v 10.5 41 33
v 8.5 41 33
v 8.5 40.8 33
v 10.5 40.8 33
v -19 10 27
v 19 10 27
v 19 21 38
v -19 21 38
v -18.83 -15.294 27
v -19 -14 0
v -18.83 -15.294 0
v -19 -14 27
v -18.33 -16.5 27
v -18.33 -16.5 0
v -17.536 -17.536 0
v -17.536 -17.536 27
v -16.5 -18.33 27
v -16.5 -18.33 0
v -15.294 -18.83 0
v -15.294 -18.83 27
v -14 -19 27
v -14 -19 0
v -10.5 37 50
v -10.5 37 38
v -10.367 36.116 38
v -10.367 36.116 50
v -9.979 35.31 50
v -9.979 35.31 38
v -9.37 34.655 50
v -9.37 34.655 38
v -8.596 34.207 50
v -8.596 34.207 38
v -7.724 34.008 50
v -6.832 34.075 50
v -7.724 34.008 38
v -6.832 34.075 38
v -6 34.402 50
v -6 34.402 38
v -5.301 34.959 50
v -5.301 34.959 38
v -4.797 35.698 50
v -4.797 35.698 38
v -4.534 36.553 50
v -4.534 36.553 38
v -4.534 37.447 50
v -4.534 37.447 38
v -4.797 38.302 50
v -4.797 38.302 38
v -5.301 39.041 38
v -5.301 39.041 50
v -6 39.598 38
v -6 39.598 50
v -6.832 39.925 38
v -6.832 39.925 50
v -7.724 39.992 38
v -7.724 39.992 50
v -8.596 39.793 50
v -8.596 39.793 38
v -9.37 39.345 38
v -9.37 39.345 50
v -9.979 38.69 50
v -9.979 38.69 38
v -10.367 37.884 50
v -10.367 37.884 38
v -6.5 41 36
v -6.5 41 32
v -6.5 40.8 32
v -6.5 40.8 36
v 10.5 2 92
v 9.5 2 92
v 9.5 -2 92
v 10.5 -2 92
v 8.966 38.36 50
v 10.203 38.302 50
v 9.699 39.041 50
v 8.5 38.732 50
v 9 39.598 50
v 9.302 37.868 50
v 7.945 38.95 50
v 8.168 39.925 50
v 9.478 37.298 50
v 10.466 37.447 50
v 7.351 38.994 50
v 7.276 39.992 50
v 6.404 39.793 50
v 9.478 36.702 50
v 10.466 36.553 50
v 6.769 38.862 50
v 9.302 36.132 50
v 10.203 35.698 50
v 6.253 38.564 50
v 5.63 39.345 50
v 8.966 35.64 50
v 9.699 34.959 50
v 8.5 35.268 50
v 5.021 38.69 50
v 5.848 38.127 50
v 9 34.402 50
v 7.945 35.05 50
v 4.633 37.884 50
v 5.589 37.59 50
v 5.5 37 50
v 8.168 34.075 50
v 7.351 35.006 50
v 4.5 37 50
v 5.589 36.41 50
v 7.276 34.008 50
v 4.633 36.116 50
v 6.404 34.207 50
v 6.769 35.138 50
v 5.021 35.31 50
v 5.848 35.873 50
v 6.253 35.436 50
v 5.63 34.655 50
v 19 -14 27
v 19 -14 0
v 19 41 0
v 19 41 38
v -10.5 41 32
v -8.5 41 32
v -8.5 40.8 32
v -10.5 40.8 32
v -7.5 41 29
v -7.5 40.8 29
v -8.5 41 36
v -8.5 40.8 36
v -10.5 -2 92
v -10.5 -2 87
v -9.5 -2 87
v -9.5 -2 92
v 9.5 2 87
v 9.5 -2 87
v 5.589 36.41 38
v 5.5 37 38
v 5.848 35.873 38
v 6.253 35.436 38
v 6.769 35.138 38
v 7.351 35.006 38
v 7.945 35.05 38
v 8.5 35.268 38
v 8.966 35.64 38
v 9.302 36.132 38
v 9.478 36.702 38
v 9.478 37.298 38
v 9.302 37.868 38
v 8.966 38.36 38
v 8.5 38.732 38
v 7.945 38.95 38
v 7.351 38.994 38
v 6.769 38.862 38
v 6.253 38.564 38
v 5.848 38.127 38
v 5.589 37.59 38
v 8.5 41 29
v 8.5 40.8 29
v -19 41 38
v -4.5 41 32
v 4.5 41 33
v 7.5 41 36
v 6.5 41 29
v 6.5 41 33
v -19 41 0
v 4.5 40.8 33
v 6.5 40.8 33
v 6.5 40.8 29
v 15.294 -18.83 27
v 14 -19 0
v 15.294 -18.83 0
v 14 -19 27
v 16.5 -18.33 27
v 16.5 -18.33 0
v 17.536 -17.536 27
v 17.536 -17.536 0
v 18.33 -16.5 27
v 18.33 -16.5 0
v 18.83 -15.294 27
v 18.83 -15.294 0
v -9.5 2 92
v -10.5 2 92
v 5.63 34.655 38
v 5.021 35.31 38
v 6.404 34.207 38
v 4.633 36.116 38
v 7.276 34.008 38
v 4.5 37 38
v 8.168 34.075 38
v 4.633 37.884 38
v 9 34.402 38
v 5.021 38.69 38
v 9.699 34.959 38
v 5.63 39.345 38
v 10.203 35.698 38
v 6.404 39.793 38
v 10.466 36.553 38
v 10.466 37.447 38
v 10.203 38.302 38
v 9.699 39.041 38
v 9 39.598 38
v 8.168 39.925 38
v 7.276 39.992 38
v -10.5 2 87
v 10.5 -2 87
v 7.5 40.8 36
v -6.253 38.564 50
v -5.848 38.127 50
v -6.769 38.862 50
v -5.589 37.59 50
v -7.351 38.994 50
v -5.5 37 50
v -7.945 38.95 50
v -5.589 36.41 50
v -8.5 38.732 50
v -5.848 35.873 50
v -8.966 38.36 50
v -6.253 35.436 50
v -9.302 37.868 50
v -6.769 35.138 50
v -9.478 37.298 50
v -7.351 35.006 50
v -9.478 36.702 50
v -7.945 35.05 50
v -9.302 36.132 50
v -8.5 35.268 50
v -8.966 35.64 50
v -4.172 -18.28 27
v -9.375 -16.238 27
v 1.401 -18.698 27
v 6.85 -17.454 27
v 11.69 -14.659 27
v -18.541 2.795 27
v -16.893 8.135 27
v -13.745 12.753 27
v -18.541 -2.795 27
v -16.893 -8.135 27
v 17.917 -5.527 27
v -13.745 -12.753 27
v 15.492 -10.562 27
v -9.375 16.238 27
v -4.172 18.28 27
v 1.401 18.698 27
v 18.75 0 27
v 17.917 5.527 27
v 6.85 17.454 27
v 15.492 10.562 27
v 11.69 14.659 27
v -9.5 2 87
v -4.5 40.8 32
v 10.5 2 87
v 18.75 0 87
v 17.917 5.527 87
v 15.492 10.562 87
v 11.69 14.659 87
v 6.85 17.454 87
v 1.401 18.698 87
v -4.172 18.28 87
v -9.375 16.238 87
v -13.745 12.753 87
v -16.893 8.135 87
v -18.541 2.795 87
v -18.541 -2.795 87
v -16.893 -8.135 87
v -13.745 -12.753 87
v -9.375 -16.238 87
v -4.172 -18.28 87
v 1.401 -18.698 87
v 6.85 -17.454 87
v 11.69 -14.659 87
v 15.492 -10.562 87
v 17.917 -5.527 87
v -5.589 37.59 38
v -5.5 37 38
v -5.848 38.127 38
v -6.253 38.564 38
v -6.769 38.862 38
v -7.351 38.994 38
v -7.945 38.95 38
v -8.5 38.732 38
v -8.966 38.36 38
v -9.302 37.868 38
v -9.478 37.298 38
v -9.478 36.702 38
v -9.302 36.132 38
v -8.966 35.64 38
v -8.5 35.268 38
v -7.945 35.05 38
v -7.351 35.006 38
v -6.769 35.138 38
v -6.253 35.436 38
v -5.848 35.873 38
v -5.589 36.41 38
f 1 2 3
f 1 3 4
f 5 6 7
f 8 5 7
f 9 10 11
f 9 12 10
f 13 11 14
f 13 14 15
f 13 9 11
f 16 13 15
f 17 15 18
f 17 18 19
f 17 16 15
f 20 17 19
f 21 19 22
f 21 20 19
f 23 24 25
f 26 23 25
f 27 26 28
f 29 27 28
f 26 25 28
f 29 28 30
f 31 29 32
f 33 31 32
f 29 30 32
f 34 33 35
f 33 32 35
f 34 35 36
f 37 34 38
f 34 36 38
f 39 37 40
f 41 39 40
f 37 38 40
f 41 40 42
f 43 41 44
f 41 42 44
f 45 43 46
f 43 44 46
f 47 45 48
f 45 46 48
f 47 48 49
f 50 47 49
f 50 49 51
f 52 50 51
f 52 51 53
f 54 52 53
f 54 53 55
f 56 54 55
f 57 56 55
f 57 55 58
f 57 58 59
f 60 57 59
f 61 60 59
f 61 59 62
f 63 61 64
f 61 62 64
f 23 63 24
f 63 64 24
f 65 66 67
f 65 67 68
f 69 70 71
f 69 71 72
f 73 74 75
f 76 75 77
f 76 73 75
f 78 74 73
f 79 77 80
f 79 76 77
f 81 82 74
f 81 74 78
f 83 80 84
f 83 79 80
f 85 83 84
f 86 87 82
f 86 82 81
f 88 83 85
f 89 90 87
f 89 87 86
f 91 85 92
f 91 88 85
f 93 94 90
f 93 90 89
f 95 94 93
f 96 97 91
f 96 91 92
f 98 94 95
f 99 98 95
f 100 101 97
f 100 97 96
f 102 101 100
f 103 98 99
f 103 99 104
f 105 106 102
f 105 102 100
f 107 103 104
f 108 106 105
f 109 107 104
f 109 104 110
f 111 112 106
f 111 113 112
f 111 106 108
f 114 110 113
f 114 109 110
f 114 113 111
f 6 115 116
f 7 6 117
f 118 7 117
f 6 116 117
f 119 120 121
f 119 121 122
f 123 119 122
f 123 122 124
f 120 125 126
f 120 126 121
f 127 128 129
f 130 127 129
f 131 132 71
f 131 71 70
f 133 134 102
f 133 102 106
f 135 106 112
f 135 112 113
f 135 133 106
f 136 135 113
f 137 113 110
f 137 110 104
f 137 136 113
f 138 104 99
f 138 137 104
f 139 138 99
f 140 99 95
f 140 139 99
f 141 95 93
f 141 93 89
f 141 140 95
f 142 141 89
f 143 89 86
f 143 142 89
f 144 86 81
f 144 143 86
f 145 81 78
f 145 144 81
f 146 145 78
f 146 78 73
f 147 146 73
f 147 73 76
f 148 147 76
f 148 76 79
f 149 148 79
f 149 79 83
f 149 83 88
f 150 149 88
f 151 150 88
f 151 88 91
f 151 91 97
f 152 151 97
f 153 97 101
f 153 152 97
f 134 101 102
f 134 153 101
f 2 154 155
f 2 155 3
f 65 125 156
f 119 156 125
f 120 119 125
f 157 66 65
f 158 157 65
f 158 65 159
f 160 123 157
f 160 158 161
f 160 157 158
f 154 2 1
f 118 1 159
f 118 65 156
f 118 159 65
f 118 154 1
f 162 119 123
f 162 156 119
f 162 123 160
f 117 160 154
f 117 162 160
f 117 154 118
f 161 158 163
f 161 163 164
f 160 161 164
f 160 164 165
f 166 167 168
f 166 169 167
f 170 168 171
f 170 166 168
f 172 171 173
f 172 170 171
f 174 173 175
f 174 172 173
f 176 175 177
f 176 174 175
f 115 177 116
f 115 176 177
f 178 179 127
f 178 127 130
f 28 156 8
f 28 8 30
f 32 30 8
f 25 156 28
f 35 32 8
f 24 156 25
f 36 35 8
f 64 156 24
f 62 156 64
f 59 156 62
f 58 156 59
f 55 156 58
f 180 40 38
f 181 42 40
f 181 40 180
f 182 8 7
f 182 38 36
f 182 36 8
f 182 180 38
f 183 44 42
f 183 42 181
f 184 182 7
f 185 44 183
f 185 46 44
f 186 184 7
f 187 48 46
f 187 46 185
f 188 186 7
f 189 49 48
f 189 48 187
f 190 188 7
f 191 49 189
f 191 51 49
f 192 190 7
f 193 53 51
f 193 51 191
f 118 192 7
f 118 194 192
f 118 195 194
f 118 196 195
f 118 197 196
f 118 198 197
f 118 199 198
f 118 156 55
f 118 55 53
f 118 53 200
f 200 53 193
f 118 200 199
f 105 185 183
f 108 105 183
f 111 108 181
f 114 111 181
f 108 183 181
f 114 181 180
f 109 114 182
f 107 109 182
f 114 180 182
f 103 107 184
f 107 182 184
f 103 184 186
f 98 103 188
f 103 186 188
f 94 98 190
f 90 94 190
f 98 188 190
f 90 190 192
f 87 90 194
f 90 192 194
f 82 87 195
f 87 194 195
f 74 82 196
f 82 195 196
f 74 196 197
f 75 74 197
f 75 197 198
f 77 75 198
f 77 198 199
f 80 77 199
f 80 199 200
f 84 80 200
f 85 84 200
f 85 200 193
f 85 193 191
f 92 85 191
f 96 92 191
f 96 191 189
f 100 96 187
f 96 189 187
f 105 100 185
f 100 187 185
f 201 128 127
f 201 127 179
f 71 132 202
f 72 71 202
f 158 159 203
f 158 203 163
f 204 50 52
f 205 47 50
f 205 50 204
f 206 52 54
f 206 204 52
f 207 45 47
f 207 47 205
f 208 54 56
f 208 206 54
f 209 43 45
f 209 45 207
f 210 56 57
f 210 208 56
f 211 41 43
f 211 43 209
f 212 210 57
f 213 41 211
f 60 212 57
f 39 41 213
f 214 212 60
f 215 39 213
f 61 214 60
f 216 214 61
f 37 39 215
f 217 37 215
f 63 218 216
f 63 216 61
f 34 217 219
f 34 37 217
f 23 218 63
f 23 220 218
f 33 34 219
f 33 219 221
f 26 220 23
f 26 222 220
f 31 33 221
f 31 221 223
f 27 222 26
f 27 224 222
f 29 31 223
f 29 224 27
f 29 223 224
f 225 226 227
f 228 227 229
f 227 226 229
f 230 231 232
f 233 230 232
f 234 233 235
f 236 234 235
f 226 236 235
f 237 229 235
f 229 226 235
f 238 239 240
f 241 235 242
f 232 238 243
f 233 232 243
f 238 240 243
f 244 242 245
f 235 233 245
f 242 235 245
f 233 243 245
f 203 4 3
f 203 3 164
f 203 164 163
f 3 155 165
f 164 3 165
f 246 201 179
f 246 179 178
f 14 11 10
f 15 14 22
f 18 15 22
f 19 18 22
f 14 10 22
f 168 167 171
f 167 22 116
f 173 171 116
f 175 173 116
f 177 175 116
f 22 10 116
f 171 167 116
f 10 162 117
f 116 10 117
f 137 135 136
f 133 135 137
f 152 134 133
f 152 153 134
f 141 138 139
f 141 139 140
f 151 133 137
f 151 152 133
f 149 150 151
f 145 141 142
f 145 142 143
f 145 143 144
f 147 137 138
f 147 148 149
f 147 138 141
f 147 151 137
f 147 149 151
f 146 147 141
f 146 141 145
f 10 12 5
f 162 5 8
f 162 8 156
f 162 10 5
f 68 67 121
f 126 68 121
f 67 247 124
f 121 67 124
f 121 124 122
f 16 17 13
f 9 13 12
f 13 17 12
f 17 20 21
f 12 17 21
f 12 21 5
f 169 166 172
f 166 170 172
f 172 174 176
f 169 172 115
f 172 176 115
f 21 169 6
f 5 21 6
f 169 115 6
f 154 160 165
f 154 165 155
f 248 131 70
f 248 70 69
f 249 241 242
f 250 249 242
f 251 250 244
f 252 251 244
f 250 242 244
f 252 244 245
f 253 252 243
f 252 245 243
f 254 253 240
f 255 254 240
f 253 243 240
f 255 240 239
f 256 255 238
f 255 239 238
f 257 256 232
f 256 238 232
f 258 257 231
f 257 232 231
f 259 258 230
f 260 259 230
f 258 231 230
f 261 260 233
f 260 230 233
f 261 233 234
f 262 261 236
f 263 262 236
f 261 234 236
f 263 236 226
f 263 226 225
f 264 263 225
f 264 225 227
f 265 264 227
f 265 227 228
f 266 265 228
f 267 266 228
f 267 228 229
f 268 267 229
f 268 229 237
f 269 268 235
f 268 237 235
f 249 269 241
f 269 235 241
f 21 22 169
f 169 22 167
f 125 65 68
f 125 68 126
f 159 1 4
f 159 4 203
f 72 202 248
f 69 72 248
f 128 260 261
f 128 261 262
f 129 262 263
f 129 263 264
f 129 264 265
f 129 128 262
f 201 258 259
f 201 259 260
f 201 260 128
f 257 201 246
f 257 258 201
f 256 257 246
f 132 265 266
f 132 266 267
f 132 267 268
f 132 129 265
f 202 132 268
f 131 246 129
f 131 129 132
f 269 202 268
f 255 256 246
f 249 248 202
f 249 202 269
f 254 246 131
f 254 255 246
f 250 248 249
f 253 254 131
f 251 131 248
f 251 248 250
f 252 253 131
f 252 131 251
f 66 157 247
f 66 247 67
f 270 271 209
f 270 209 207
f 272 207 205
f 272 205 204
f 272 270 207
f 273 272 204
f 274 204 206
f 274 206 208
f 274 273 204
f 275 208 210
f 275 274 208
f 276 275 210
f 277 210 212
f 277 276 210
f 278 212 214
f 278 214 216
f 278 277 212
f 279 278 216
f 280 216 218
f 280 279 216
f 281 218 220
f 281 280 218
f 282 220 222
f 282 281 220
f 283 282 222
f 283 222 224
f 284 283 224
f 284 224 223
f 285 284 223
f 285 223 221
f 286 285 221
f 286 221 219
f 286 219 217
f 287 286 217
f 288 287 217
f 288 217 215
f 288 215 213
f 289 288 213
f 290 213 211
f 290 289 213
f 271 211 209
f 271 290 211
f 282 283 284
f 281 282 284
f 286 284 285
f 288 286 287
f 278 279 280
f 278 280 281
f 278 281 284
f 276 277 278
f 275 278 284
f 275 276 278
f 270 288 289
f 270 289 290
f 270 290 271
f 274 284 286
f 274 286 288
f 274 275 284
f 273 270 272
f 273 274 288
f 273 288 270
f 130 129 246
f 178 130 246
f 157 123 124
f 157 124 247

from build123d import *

# Parameters (mm, degrees)
SKETCH1_W      = 38
SKETCH1_H      = 60
EXTRUDE1_DEPTH = 38
EXTRUDE2_DEPTH = 68.594378464
FILLET1_R      = 5
SKETCH3_R      = 18.75
EXTRUDE3_DEPTH = 60
SKETCH4_R      = 3
SKETCH4_R_2    = 2
EXTRUDE4_DEPTH = 12
EXTRUDE5_DEPTH = 0.2
SKETCH6_W      = 1
SKETCH6_H      = 4
EXTRUDE6_DEPTH = 5


with BuildPart() as part:
    # Sketch1 → Extrude1 (new body)
    with BuildSketch(Plane.XY):
        with Locations((0, 11)):
            Rectangle(SKETCH1_W, SKETCH1_H)
    extrude(amount=EXTRUDE1_DEPTH)

    # Sketch2 → Extrude2 (cut, through all)
    with BuildSketch(Plane(origin=(19, 0, 0), x_dir=(0, 0, -1), z_dir=(1, 0, 0))):
        Polygon((-38, -19), (-27, -19), (-27, 10), (-38, 21), align=None)
    extrude(amount=-EXTRUDE2_DEPTH, mode=Mode.SUBTRACT)

    # Fillet1
    fillet1_edges = [part.edges().sort_by_distance(p)[0] for p in [
        (-19, -19, 13.5),
        (19, -19, 13.5),
    ]]
    fillet(fillet1_edges, radius=FILLET1_R)

    # Sketch4 → Extrude4 (add)
    # profile 1 of 2: a face of its own
    with BuildSketch(Plane.XY.offset(38)):
        with Locations(Location((-7.5, 37, 0), (0, 0, 180))):
            Circle(SKETCH4_R)
        with Locations((-7.5, 37)):
            Circle(SKETCH4_R_2, mode=Mode.SUBTRACT)
    # profile 2 of 2: a face of its own
    with BuildSketch(Plane.XY.offset(38)):
        with Locations(Location((7.5, 37, 0), (0, 0, 180))):
            Circle(SKETCH4_R)
        with Locations(Location((7.5, 37, 0), (0, 0, 180))):
            Circle(SKETCH4_R_2, mode=Mode.SUBTRACT)
    extrude(amount=EXTRUDE4_DEPTH)

    # Sketch5 → Extrude5 (cut)
    with BuildSketch(Plane(origin=(0, 41, 0), x_dir=(1, 0, 0), z_dir=(0, 1, 0))):
        Polygon((-8.5, -36), (-8.5, -32), (-10.5, -32), (-7.5, -29), (-4.5, -32), (-6.5, -32), (-6.5, -36), align=None)
        Polygon((6.5, -29), (8.5, -29), (8.5, -33), (10.5, -33), (7.5, -36), (4.5, -33), (6.5, -33), align=None)
    extrude(amount=-EXTRUDE5_DEPTH, mode=Mode.SUBTRACT)


with BuildPart() as body_2:
    # Sketch3 → Extrude3 (new body)
    with BuildSketch(Plane.XY.offset(27)):
        Circle(SKETCH3_R)
    extrude(amount=EXTRUDE3_DEPTH)

    # Sketch6 → Extrude6 (add)
    with BuildSketch(Plane.XY.offset(87)):
        with Locations((-10, 0)):
            Rectangle(SKETCH6_W, SKETCH6_H)
        with Locations((10, 0)):
            Rectangle(SKETCH6_W, SKETCH6_H)
    extrude(amount=EXTRUDE6_DEPTH)


solid = Compound([part.part, body_2.part])
